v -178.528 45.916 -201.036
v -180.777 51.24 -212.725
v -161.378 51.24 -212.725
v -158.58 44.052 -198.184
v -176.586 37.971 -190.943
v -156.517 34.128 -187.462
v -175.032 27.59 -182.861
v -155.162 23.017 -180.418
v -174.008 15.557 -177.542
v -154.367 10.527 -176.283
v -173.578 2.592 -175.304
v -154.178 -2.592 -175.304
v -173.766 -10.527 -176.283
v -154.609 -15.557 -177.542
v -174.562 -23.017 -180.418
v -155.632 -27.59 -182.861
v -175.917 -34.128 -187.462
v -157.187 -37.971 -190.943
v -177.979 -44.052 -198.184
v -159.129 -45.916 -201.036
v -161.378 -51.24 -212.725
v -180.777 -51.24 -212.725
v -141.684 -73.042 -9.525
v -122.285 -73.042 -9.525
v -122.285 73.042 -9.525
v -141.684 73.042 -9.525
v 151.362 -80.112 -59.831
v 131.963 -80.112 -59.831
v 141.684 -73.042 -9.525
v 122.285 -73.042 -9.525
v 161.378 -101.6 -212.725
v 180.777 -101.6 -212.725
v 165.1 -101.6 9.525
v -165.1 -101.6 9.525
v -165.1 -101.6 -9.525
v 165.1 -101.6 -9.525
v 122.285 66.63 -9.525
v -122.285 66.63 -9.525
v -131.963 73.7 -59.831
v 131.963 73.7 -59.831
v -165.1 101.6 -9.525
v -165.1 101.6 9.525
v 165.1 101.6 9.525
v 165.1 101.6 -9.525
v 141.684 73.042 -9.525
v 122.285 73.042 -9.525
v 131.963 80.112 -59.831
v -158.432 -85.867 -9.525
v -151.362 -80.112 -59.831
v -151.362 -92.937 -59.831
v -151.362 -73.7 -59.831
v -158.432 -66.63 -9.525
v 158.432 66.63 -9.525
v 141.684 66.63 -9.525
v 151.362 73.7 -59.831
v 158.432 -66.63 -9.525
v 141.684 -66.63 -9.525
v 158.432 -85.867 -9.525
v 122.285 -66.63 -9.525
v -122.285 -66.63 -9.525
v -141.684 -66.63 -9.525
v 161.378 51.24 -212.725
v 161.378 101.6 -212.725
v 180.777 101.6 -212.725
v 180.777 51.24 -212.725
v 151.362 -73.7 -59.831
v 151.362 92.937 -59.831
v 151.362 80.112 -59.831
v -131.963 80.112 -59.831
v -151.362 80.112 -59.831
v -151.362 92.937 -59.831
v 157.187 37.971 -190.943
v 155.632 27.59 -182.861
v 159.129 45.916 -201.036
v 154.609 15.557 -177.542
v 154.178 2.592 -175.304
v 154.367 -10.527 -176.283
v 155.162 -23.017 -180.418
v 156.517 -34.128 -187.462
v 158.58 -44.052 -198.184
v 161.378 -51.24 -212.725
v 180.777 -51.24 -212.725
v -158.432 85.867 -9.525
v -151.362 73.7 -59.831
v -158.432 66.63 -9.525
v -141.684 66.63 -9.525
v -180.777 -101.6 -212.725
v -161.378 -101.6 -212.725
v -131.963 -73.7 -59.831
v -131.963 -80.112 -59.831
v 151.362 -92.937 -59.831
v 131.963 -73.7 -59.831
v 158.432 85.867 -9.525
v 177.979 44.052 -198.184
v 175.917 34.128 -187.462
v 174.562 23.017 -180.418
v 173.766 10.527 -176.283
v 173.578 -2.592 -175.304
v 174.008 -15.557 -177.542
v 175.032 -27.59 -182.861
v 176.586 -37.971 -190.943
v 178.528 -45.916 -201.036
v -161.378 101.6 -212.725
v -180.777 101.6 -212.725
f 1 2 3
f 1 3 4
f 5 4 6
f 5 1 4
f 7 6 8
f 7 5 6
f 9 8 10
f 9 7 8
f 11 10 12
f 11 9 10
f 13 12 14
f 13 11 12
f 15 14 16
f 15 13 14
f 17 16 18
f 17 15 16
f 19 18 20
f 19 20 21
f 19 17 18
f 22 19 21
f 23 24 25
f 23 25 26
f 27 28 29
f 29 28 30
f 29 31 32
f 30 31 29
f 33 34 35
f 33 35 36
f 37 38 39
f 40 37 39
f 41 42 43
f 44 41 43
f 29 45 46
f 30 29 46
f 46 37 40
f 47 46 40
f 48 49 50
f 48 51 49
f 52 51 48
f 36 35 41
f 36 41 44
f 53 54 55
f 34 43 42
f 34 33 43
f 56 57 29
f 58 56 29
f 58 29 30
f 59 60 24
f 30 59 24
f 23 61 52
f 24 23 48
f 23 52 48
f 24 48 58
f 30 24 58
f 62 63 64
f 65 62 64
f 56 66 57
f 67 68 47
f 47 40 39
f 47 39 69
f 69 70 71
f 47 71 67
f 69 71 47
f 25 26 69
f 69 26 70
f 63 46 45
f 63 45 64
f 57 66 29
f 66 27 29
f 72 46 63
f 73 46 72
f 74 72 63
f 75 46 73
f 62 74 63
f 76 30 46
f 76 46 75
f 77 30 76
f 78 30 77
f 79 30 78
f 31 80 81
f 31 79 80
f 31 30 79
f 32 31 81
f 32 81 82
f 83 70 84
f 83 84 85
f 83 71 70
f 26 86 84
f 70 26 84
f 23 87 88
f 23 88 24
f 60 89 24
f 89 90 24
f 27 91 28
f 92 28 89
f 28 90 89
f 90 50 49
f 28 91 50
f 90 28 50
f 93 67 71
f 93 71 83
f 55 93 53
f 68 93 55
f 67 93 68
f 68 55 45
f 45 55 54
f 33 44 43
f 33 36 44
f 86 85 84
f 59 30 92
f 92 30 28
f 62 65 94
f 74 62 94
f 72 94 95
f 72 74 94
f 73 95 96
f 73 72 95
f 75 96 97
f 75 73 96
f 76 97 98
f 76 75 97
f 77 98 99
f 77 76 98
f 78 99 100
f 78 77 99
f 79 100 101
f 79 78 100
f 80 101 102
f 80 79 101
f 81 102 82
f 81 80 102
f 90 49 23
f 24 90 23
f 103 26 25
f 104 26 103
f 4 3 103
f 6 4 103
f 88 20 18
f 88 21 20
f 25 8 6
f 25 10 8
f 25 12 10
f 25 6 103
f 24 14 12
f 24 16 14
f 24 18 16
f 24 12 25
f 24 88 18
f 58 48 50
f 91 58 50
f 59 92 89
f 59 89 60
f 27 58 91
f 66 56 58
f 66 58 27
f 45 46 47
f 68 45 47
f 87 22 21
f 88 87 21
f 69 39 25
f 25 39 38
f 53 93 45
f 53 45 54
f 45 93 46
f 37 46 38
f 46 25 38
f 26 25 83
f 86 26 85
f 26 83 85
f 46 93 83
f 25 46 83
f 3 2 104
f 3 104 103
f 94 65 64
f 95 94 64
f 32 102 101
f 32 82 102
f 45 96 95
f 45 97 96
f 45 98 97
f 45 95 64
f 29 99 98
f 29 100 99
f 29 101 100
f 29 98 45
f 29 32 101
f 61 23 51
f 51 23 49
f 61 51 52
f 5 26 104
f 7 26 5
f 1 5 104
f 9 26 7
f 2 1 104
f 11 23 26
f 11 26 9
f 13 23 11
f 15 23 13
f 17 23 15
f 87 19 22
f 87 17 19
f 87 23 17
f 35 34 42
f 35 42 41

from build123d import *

# Parameters (mm, degrees)
F1_DEPTH      = 101.6
F2_DEPTH      = 101.6
F2_DEPTH_BACK = 101.6
F4_DEPTH      = 180.7780199658
F4_DEPTH_BACK = 180.7780199658
F6_DEPTH      = 165.1
F6_DEPTH_BACK = 165.1
F7_DEPTH      = 101.601
F7_DEPTH_BACK = 101.601


with BuildPart() as f1:
    # F0 (on Front) → F1 (new body, symmetric)
    with BuildSketch(Plane.XZ):
        Polygon((165.1, 9.525), (-165.1, 9.525), (-165.1, -9.525), (-158.4321111441, -9.525), (-141.6839671327, -9.525), (-122.2846235293, -9.525), (122.2846235293, -9.525), (141.6839671327, -9.525), (158.4321111441, -9.525), (165.1, -9.525), align=None)
    extrude(amount=F1_DEPTH, both=True)


with BuildPart() as f2:
    # F0 (on Front) → F2 (new body, two sides)
    with BuildSketch(Plane.XZ) as f2_sk:
        Polygon((-131.9627740119, -59.8306178921), (-151.3621176153, -59.8306178921), (-180.7770199658, -212.725), (-161.3776763624, -212.725), align=None)
        Polygon((-122.2846235293, -9.525), (-141.6839671327, -9.525), (-151.3621176153, -59.8306178921), (-131.9627740119, -59.8306178921), align=None)
    extrude(amount=F2_DEPTH)
    extrude(f2_sk.sketch, amount=-F2_DEPTH_BACK)


with BuildPart() as f2b:
    # F0 (on Front) → F2, piece 2 (new body, two sides)
    with BuildSketch(Plane.XZ) as f2_2_sk:
        Polygon((180.7770199658, -212.725), (151.3621176153, -59.8306178921), (131.9627740119, -59.8306178921), (161.3776763624, -212.725), align=None)
        Polygon((151.3621176153, -59.8306178921), (141.6839671327, -9.525), (122.2846235293, -9.525), (131.9627740119, -59.8306178921), align=None)
    extrude(amount=F2_DEPTH)
    extrude(f2_2_sk.sketch, amount=-F2_DEPTH_BACK)


with BuildPart() as f4_tool:
    # F3 (on Right) → F4 (new body, two sides)
    with BuildSketch(Plane.YZ) as f4_sk:
        Polygon((-101.6, -212.725), (-73.0421023885, -9.525), (-101.6000000004, -9.525), align=None)
        with BuildLine():
            Line((-51.2400512201, -212.725), (51.2400512201, -212.725))
            ThreePointArc((51.2400512201, -212.725), (0, -175.2418500158), (-51.2400512201, -212.725))
        make_face()
        Polygon((101.6, -212.725), (101.6, -9.525), (73.0421023885, -9.525), align=None)
    extrude(amount=-F4_DEPTH)
    extrude(f4_sk.sketch, amount=F4_DEPTH_BACK)


with BuildPart() as f2_1:
    add(f2.part)

    # F4: cut by f4_tool
    add(f4_tool.part, mode=Mode.SUBTRACT)


with BuildPart() as f2b_1:
    add(f2b.part)

    # F4: cut by f4_tool
    add(f4_tool.part, mode=Mode.SUBTRACT)


with BuildPart() as f6:
    # F5 (on Right) → F6 (new body, two sides)
    with BuildSketch(Plane.YZ) as f6_sk:
        Polygon((-80.1120959173, -59.8306178921), (-73.0421023885, -9.525), (-85.8669125597, -9.525), (-92.9369060884, -59.8306178921), align=None)
        Polygon((-66.6296973032, -9.525), (-73.0421023885, -9.525), (-80.1120959173, -59.8306178921), (-73.6996908319, -59.8306178921), align=None)
    extrude(amount=-F6_DEPTH)
    extrude(f6_sk.sketch, amount=F6_DEPTH_BACK)


with BuildPart() as f6b:
    # F5 (on Right) → F6, piece 2 (new body, two sides)
    with BuildSketch(Plane.YZ) as f6_2_sk:
        Polygon((73.0421023885, -9.525), (66.6296973032, -9.525), (73.6996908319, -59.8306178921), (80.1120959173, -59.8306178921), align=None)
        Polygon((85.8669125597, -9.525), (73.0421023885, -9.525), (80.1120959173, -59.8306178921), (92.9369060883, -59.8306178921), align=None)
    extrude(amount=-F6_DEPTH)
    extrude(f6_2_sk.sketch, amount=F6_DEPTH_BACK)


with BuildPart() as f7_tool:
    # F0 (on Front) → F7 (new body, two sides)
    with BuildSketch(Plane.XZ) as f7_sk:
        Polygon((-158.4321111441, -9.525), (-165.1, -9.525), (-165.1, -59.8306178921), (-151.3621176153, -59.8306178921), align=None)
        Polygon((165.1, -59.8306178921), (165.1, -9.525), (158.4321111441, -9.525), (151.3621176153, -59.8306178921), align=None)
    extrude(amount=-F7_DEPTH)
    extrude(f7_sk.sketch, amount=F7_DEPTH_BACK)


with BuildPart() as f6_1:
    add(f6.part)

    # F7: cut by f7_tool
    add(f7_tool.part, mode=Mode.SUBTRACT)

    # F9: cut F2
    add(f2_1.part, mode=Mode.SUBTRACT)

    # F10: cut F2b
    add(f2b_1.part, mode=Mode.SUBTRACT)


with BuildPart() as f6b_1:
    add(f6b.part)

    # F7: cut by f7_tool
    add(f7_tool.part, mode=Mode.SUBTRACT)

    # F8: cut F2
    add(f2_1.part, mode=Mode.SUBTRACT)

    # F11: cut F2b
    add(f2b_1.part, mode=Mode.SUBTRACT)


solid = Compound([f1.part, f2_1.part, f2b_1.part, f6_1.part, f6b_1.part])
